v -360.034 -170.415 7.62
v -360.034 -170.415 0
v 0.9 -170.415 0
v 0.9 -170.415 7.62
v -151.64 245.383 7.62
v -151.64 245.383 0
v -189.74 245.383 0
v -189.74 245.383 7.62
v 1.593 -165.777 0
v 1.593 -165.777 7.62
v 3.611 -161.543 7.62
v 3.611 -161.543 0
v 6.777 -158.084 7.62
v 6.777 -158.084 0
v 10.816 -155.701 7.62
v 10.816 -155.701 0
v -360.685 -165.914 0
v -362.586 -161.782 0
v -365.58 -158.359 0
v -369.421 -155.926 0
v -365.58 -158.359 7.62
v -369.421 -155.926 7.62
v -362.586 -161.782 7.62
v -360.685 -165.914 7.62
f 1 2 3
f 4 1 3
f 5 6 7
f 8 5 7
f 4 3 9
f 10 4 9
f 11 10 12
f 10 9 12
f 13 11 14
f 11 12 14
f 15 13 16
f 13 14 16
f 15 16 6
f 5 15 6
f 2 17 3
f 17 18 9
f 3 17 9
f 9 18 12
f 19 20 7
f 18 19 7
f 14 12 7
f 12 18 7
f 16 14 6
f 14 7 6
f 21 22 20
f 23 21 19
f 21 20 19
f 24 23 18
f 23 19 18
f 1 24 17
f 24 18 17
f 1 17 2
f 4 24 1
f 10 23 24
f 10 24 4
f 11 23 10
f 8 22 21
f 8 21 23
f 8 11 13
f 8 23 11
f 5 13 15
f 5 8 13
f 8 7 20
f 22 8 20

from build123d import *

# Parameters (mm, degrees)
BOSS_EXTRUDE1_DEPTH = 7.62
SKETCH5_R           = 15.875
CUT_EXTRUDE2_DEPTH  = 50.8
SKETCH6_R           = 15.875
CUT_EXTRUDE3_DEPTH  = 50.8


with BuildPart() as part:
    # Sketch2 → Boss-Extrude1 (new body)
    with BuildSketch(Plane.XY):
        Polygon((-189.740054039, 245.383385713), (-375.90852523, -170.414614287), (16.77547477, -170.414614287), (-151.640054039, 245.383385713), align=None)
    extrude(amount=BOSS_EXTRUDE1_DEPTH)

    # Sketch5 → Cut-Extrude2 (cut)
    with BuildSketch(Plane(origin=(0, 0, 0), x_dir=(-1, 0, 0), z_dir=(0, 0, -1))):
        with Locations((375.90852523, -170.414614287)):
            Circle(SKETCH5_R)
    extrude(amount=-CUT_EXTRUDE2_DEPTH, mode=Mode.SUBTRACT)

    # Sketch6 → Cut-Extrude3 (cut)
    with BuildSketch(Plane(origin=(0, 0, 0), x_dir=(-1, 0, 0), z_dir=(0, 0, -1))):
        with Locations((-16.77547477, -170.414614287)):
            Circle(SKETCH6_R)
    extrude(amount=-CUT_EXTRUDE3_DEPTH, mode=Mode.SUBTRACT)


solid = part.part
